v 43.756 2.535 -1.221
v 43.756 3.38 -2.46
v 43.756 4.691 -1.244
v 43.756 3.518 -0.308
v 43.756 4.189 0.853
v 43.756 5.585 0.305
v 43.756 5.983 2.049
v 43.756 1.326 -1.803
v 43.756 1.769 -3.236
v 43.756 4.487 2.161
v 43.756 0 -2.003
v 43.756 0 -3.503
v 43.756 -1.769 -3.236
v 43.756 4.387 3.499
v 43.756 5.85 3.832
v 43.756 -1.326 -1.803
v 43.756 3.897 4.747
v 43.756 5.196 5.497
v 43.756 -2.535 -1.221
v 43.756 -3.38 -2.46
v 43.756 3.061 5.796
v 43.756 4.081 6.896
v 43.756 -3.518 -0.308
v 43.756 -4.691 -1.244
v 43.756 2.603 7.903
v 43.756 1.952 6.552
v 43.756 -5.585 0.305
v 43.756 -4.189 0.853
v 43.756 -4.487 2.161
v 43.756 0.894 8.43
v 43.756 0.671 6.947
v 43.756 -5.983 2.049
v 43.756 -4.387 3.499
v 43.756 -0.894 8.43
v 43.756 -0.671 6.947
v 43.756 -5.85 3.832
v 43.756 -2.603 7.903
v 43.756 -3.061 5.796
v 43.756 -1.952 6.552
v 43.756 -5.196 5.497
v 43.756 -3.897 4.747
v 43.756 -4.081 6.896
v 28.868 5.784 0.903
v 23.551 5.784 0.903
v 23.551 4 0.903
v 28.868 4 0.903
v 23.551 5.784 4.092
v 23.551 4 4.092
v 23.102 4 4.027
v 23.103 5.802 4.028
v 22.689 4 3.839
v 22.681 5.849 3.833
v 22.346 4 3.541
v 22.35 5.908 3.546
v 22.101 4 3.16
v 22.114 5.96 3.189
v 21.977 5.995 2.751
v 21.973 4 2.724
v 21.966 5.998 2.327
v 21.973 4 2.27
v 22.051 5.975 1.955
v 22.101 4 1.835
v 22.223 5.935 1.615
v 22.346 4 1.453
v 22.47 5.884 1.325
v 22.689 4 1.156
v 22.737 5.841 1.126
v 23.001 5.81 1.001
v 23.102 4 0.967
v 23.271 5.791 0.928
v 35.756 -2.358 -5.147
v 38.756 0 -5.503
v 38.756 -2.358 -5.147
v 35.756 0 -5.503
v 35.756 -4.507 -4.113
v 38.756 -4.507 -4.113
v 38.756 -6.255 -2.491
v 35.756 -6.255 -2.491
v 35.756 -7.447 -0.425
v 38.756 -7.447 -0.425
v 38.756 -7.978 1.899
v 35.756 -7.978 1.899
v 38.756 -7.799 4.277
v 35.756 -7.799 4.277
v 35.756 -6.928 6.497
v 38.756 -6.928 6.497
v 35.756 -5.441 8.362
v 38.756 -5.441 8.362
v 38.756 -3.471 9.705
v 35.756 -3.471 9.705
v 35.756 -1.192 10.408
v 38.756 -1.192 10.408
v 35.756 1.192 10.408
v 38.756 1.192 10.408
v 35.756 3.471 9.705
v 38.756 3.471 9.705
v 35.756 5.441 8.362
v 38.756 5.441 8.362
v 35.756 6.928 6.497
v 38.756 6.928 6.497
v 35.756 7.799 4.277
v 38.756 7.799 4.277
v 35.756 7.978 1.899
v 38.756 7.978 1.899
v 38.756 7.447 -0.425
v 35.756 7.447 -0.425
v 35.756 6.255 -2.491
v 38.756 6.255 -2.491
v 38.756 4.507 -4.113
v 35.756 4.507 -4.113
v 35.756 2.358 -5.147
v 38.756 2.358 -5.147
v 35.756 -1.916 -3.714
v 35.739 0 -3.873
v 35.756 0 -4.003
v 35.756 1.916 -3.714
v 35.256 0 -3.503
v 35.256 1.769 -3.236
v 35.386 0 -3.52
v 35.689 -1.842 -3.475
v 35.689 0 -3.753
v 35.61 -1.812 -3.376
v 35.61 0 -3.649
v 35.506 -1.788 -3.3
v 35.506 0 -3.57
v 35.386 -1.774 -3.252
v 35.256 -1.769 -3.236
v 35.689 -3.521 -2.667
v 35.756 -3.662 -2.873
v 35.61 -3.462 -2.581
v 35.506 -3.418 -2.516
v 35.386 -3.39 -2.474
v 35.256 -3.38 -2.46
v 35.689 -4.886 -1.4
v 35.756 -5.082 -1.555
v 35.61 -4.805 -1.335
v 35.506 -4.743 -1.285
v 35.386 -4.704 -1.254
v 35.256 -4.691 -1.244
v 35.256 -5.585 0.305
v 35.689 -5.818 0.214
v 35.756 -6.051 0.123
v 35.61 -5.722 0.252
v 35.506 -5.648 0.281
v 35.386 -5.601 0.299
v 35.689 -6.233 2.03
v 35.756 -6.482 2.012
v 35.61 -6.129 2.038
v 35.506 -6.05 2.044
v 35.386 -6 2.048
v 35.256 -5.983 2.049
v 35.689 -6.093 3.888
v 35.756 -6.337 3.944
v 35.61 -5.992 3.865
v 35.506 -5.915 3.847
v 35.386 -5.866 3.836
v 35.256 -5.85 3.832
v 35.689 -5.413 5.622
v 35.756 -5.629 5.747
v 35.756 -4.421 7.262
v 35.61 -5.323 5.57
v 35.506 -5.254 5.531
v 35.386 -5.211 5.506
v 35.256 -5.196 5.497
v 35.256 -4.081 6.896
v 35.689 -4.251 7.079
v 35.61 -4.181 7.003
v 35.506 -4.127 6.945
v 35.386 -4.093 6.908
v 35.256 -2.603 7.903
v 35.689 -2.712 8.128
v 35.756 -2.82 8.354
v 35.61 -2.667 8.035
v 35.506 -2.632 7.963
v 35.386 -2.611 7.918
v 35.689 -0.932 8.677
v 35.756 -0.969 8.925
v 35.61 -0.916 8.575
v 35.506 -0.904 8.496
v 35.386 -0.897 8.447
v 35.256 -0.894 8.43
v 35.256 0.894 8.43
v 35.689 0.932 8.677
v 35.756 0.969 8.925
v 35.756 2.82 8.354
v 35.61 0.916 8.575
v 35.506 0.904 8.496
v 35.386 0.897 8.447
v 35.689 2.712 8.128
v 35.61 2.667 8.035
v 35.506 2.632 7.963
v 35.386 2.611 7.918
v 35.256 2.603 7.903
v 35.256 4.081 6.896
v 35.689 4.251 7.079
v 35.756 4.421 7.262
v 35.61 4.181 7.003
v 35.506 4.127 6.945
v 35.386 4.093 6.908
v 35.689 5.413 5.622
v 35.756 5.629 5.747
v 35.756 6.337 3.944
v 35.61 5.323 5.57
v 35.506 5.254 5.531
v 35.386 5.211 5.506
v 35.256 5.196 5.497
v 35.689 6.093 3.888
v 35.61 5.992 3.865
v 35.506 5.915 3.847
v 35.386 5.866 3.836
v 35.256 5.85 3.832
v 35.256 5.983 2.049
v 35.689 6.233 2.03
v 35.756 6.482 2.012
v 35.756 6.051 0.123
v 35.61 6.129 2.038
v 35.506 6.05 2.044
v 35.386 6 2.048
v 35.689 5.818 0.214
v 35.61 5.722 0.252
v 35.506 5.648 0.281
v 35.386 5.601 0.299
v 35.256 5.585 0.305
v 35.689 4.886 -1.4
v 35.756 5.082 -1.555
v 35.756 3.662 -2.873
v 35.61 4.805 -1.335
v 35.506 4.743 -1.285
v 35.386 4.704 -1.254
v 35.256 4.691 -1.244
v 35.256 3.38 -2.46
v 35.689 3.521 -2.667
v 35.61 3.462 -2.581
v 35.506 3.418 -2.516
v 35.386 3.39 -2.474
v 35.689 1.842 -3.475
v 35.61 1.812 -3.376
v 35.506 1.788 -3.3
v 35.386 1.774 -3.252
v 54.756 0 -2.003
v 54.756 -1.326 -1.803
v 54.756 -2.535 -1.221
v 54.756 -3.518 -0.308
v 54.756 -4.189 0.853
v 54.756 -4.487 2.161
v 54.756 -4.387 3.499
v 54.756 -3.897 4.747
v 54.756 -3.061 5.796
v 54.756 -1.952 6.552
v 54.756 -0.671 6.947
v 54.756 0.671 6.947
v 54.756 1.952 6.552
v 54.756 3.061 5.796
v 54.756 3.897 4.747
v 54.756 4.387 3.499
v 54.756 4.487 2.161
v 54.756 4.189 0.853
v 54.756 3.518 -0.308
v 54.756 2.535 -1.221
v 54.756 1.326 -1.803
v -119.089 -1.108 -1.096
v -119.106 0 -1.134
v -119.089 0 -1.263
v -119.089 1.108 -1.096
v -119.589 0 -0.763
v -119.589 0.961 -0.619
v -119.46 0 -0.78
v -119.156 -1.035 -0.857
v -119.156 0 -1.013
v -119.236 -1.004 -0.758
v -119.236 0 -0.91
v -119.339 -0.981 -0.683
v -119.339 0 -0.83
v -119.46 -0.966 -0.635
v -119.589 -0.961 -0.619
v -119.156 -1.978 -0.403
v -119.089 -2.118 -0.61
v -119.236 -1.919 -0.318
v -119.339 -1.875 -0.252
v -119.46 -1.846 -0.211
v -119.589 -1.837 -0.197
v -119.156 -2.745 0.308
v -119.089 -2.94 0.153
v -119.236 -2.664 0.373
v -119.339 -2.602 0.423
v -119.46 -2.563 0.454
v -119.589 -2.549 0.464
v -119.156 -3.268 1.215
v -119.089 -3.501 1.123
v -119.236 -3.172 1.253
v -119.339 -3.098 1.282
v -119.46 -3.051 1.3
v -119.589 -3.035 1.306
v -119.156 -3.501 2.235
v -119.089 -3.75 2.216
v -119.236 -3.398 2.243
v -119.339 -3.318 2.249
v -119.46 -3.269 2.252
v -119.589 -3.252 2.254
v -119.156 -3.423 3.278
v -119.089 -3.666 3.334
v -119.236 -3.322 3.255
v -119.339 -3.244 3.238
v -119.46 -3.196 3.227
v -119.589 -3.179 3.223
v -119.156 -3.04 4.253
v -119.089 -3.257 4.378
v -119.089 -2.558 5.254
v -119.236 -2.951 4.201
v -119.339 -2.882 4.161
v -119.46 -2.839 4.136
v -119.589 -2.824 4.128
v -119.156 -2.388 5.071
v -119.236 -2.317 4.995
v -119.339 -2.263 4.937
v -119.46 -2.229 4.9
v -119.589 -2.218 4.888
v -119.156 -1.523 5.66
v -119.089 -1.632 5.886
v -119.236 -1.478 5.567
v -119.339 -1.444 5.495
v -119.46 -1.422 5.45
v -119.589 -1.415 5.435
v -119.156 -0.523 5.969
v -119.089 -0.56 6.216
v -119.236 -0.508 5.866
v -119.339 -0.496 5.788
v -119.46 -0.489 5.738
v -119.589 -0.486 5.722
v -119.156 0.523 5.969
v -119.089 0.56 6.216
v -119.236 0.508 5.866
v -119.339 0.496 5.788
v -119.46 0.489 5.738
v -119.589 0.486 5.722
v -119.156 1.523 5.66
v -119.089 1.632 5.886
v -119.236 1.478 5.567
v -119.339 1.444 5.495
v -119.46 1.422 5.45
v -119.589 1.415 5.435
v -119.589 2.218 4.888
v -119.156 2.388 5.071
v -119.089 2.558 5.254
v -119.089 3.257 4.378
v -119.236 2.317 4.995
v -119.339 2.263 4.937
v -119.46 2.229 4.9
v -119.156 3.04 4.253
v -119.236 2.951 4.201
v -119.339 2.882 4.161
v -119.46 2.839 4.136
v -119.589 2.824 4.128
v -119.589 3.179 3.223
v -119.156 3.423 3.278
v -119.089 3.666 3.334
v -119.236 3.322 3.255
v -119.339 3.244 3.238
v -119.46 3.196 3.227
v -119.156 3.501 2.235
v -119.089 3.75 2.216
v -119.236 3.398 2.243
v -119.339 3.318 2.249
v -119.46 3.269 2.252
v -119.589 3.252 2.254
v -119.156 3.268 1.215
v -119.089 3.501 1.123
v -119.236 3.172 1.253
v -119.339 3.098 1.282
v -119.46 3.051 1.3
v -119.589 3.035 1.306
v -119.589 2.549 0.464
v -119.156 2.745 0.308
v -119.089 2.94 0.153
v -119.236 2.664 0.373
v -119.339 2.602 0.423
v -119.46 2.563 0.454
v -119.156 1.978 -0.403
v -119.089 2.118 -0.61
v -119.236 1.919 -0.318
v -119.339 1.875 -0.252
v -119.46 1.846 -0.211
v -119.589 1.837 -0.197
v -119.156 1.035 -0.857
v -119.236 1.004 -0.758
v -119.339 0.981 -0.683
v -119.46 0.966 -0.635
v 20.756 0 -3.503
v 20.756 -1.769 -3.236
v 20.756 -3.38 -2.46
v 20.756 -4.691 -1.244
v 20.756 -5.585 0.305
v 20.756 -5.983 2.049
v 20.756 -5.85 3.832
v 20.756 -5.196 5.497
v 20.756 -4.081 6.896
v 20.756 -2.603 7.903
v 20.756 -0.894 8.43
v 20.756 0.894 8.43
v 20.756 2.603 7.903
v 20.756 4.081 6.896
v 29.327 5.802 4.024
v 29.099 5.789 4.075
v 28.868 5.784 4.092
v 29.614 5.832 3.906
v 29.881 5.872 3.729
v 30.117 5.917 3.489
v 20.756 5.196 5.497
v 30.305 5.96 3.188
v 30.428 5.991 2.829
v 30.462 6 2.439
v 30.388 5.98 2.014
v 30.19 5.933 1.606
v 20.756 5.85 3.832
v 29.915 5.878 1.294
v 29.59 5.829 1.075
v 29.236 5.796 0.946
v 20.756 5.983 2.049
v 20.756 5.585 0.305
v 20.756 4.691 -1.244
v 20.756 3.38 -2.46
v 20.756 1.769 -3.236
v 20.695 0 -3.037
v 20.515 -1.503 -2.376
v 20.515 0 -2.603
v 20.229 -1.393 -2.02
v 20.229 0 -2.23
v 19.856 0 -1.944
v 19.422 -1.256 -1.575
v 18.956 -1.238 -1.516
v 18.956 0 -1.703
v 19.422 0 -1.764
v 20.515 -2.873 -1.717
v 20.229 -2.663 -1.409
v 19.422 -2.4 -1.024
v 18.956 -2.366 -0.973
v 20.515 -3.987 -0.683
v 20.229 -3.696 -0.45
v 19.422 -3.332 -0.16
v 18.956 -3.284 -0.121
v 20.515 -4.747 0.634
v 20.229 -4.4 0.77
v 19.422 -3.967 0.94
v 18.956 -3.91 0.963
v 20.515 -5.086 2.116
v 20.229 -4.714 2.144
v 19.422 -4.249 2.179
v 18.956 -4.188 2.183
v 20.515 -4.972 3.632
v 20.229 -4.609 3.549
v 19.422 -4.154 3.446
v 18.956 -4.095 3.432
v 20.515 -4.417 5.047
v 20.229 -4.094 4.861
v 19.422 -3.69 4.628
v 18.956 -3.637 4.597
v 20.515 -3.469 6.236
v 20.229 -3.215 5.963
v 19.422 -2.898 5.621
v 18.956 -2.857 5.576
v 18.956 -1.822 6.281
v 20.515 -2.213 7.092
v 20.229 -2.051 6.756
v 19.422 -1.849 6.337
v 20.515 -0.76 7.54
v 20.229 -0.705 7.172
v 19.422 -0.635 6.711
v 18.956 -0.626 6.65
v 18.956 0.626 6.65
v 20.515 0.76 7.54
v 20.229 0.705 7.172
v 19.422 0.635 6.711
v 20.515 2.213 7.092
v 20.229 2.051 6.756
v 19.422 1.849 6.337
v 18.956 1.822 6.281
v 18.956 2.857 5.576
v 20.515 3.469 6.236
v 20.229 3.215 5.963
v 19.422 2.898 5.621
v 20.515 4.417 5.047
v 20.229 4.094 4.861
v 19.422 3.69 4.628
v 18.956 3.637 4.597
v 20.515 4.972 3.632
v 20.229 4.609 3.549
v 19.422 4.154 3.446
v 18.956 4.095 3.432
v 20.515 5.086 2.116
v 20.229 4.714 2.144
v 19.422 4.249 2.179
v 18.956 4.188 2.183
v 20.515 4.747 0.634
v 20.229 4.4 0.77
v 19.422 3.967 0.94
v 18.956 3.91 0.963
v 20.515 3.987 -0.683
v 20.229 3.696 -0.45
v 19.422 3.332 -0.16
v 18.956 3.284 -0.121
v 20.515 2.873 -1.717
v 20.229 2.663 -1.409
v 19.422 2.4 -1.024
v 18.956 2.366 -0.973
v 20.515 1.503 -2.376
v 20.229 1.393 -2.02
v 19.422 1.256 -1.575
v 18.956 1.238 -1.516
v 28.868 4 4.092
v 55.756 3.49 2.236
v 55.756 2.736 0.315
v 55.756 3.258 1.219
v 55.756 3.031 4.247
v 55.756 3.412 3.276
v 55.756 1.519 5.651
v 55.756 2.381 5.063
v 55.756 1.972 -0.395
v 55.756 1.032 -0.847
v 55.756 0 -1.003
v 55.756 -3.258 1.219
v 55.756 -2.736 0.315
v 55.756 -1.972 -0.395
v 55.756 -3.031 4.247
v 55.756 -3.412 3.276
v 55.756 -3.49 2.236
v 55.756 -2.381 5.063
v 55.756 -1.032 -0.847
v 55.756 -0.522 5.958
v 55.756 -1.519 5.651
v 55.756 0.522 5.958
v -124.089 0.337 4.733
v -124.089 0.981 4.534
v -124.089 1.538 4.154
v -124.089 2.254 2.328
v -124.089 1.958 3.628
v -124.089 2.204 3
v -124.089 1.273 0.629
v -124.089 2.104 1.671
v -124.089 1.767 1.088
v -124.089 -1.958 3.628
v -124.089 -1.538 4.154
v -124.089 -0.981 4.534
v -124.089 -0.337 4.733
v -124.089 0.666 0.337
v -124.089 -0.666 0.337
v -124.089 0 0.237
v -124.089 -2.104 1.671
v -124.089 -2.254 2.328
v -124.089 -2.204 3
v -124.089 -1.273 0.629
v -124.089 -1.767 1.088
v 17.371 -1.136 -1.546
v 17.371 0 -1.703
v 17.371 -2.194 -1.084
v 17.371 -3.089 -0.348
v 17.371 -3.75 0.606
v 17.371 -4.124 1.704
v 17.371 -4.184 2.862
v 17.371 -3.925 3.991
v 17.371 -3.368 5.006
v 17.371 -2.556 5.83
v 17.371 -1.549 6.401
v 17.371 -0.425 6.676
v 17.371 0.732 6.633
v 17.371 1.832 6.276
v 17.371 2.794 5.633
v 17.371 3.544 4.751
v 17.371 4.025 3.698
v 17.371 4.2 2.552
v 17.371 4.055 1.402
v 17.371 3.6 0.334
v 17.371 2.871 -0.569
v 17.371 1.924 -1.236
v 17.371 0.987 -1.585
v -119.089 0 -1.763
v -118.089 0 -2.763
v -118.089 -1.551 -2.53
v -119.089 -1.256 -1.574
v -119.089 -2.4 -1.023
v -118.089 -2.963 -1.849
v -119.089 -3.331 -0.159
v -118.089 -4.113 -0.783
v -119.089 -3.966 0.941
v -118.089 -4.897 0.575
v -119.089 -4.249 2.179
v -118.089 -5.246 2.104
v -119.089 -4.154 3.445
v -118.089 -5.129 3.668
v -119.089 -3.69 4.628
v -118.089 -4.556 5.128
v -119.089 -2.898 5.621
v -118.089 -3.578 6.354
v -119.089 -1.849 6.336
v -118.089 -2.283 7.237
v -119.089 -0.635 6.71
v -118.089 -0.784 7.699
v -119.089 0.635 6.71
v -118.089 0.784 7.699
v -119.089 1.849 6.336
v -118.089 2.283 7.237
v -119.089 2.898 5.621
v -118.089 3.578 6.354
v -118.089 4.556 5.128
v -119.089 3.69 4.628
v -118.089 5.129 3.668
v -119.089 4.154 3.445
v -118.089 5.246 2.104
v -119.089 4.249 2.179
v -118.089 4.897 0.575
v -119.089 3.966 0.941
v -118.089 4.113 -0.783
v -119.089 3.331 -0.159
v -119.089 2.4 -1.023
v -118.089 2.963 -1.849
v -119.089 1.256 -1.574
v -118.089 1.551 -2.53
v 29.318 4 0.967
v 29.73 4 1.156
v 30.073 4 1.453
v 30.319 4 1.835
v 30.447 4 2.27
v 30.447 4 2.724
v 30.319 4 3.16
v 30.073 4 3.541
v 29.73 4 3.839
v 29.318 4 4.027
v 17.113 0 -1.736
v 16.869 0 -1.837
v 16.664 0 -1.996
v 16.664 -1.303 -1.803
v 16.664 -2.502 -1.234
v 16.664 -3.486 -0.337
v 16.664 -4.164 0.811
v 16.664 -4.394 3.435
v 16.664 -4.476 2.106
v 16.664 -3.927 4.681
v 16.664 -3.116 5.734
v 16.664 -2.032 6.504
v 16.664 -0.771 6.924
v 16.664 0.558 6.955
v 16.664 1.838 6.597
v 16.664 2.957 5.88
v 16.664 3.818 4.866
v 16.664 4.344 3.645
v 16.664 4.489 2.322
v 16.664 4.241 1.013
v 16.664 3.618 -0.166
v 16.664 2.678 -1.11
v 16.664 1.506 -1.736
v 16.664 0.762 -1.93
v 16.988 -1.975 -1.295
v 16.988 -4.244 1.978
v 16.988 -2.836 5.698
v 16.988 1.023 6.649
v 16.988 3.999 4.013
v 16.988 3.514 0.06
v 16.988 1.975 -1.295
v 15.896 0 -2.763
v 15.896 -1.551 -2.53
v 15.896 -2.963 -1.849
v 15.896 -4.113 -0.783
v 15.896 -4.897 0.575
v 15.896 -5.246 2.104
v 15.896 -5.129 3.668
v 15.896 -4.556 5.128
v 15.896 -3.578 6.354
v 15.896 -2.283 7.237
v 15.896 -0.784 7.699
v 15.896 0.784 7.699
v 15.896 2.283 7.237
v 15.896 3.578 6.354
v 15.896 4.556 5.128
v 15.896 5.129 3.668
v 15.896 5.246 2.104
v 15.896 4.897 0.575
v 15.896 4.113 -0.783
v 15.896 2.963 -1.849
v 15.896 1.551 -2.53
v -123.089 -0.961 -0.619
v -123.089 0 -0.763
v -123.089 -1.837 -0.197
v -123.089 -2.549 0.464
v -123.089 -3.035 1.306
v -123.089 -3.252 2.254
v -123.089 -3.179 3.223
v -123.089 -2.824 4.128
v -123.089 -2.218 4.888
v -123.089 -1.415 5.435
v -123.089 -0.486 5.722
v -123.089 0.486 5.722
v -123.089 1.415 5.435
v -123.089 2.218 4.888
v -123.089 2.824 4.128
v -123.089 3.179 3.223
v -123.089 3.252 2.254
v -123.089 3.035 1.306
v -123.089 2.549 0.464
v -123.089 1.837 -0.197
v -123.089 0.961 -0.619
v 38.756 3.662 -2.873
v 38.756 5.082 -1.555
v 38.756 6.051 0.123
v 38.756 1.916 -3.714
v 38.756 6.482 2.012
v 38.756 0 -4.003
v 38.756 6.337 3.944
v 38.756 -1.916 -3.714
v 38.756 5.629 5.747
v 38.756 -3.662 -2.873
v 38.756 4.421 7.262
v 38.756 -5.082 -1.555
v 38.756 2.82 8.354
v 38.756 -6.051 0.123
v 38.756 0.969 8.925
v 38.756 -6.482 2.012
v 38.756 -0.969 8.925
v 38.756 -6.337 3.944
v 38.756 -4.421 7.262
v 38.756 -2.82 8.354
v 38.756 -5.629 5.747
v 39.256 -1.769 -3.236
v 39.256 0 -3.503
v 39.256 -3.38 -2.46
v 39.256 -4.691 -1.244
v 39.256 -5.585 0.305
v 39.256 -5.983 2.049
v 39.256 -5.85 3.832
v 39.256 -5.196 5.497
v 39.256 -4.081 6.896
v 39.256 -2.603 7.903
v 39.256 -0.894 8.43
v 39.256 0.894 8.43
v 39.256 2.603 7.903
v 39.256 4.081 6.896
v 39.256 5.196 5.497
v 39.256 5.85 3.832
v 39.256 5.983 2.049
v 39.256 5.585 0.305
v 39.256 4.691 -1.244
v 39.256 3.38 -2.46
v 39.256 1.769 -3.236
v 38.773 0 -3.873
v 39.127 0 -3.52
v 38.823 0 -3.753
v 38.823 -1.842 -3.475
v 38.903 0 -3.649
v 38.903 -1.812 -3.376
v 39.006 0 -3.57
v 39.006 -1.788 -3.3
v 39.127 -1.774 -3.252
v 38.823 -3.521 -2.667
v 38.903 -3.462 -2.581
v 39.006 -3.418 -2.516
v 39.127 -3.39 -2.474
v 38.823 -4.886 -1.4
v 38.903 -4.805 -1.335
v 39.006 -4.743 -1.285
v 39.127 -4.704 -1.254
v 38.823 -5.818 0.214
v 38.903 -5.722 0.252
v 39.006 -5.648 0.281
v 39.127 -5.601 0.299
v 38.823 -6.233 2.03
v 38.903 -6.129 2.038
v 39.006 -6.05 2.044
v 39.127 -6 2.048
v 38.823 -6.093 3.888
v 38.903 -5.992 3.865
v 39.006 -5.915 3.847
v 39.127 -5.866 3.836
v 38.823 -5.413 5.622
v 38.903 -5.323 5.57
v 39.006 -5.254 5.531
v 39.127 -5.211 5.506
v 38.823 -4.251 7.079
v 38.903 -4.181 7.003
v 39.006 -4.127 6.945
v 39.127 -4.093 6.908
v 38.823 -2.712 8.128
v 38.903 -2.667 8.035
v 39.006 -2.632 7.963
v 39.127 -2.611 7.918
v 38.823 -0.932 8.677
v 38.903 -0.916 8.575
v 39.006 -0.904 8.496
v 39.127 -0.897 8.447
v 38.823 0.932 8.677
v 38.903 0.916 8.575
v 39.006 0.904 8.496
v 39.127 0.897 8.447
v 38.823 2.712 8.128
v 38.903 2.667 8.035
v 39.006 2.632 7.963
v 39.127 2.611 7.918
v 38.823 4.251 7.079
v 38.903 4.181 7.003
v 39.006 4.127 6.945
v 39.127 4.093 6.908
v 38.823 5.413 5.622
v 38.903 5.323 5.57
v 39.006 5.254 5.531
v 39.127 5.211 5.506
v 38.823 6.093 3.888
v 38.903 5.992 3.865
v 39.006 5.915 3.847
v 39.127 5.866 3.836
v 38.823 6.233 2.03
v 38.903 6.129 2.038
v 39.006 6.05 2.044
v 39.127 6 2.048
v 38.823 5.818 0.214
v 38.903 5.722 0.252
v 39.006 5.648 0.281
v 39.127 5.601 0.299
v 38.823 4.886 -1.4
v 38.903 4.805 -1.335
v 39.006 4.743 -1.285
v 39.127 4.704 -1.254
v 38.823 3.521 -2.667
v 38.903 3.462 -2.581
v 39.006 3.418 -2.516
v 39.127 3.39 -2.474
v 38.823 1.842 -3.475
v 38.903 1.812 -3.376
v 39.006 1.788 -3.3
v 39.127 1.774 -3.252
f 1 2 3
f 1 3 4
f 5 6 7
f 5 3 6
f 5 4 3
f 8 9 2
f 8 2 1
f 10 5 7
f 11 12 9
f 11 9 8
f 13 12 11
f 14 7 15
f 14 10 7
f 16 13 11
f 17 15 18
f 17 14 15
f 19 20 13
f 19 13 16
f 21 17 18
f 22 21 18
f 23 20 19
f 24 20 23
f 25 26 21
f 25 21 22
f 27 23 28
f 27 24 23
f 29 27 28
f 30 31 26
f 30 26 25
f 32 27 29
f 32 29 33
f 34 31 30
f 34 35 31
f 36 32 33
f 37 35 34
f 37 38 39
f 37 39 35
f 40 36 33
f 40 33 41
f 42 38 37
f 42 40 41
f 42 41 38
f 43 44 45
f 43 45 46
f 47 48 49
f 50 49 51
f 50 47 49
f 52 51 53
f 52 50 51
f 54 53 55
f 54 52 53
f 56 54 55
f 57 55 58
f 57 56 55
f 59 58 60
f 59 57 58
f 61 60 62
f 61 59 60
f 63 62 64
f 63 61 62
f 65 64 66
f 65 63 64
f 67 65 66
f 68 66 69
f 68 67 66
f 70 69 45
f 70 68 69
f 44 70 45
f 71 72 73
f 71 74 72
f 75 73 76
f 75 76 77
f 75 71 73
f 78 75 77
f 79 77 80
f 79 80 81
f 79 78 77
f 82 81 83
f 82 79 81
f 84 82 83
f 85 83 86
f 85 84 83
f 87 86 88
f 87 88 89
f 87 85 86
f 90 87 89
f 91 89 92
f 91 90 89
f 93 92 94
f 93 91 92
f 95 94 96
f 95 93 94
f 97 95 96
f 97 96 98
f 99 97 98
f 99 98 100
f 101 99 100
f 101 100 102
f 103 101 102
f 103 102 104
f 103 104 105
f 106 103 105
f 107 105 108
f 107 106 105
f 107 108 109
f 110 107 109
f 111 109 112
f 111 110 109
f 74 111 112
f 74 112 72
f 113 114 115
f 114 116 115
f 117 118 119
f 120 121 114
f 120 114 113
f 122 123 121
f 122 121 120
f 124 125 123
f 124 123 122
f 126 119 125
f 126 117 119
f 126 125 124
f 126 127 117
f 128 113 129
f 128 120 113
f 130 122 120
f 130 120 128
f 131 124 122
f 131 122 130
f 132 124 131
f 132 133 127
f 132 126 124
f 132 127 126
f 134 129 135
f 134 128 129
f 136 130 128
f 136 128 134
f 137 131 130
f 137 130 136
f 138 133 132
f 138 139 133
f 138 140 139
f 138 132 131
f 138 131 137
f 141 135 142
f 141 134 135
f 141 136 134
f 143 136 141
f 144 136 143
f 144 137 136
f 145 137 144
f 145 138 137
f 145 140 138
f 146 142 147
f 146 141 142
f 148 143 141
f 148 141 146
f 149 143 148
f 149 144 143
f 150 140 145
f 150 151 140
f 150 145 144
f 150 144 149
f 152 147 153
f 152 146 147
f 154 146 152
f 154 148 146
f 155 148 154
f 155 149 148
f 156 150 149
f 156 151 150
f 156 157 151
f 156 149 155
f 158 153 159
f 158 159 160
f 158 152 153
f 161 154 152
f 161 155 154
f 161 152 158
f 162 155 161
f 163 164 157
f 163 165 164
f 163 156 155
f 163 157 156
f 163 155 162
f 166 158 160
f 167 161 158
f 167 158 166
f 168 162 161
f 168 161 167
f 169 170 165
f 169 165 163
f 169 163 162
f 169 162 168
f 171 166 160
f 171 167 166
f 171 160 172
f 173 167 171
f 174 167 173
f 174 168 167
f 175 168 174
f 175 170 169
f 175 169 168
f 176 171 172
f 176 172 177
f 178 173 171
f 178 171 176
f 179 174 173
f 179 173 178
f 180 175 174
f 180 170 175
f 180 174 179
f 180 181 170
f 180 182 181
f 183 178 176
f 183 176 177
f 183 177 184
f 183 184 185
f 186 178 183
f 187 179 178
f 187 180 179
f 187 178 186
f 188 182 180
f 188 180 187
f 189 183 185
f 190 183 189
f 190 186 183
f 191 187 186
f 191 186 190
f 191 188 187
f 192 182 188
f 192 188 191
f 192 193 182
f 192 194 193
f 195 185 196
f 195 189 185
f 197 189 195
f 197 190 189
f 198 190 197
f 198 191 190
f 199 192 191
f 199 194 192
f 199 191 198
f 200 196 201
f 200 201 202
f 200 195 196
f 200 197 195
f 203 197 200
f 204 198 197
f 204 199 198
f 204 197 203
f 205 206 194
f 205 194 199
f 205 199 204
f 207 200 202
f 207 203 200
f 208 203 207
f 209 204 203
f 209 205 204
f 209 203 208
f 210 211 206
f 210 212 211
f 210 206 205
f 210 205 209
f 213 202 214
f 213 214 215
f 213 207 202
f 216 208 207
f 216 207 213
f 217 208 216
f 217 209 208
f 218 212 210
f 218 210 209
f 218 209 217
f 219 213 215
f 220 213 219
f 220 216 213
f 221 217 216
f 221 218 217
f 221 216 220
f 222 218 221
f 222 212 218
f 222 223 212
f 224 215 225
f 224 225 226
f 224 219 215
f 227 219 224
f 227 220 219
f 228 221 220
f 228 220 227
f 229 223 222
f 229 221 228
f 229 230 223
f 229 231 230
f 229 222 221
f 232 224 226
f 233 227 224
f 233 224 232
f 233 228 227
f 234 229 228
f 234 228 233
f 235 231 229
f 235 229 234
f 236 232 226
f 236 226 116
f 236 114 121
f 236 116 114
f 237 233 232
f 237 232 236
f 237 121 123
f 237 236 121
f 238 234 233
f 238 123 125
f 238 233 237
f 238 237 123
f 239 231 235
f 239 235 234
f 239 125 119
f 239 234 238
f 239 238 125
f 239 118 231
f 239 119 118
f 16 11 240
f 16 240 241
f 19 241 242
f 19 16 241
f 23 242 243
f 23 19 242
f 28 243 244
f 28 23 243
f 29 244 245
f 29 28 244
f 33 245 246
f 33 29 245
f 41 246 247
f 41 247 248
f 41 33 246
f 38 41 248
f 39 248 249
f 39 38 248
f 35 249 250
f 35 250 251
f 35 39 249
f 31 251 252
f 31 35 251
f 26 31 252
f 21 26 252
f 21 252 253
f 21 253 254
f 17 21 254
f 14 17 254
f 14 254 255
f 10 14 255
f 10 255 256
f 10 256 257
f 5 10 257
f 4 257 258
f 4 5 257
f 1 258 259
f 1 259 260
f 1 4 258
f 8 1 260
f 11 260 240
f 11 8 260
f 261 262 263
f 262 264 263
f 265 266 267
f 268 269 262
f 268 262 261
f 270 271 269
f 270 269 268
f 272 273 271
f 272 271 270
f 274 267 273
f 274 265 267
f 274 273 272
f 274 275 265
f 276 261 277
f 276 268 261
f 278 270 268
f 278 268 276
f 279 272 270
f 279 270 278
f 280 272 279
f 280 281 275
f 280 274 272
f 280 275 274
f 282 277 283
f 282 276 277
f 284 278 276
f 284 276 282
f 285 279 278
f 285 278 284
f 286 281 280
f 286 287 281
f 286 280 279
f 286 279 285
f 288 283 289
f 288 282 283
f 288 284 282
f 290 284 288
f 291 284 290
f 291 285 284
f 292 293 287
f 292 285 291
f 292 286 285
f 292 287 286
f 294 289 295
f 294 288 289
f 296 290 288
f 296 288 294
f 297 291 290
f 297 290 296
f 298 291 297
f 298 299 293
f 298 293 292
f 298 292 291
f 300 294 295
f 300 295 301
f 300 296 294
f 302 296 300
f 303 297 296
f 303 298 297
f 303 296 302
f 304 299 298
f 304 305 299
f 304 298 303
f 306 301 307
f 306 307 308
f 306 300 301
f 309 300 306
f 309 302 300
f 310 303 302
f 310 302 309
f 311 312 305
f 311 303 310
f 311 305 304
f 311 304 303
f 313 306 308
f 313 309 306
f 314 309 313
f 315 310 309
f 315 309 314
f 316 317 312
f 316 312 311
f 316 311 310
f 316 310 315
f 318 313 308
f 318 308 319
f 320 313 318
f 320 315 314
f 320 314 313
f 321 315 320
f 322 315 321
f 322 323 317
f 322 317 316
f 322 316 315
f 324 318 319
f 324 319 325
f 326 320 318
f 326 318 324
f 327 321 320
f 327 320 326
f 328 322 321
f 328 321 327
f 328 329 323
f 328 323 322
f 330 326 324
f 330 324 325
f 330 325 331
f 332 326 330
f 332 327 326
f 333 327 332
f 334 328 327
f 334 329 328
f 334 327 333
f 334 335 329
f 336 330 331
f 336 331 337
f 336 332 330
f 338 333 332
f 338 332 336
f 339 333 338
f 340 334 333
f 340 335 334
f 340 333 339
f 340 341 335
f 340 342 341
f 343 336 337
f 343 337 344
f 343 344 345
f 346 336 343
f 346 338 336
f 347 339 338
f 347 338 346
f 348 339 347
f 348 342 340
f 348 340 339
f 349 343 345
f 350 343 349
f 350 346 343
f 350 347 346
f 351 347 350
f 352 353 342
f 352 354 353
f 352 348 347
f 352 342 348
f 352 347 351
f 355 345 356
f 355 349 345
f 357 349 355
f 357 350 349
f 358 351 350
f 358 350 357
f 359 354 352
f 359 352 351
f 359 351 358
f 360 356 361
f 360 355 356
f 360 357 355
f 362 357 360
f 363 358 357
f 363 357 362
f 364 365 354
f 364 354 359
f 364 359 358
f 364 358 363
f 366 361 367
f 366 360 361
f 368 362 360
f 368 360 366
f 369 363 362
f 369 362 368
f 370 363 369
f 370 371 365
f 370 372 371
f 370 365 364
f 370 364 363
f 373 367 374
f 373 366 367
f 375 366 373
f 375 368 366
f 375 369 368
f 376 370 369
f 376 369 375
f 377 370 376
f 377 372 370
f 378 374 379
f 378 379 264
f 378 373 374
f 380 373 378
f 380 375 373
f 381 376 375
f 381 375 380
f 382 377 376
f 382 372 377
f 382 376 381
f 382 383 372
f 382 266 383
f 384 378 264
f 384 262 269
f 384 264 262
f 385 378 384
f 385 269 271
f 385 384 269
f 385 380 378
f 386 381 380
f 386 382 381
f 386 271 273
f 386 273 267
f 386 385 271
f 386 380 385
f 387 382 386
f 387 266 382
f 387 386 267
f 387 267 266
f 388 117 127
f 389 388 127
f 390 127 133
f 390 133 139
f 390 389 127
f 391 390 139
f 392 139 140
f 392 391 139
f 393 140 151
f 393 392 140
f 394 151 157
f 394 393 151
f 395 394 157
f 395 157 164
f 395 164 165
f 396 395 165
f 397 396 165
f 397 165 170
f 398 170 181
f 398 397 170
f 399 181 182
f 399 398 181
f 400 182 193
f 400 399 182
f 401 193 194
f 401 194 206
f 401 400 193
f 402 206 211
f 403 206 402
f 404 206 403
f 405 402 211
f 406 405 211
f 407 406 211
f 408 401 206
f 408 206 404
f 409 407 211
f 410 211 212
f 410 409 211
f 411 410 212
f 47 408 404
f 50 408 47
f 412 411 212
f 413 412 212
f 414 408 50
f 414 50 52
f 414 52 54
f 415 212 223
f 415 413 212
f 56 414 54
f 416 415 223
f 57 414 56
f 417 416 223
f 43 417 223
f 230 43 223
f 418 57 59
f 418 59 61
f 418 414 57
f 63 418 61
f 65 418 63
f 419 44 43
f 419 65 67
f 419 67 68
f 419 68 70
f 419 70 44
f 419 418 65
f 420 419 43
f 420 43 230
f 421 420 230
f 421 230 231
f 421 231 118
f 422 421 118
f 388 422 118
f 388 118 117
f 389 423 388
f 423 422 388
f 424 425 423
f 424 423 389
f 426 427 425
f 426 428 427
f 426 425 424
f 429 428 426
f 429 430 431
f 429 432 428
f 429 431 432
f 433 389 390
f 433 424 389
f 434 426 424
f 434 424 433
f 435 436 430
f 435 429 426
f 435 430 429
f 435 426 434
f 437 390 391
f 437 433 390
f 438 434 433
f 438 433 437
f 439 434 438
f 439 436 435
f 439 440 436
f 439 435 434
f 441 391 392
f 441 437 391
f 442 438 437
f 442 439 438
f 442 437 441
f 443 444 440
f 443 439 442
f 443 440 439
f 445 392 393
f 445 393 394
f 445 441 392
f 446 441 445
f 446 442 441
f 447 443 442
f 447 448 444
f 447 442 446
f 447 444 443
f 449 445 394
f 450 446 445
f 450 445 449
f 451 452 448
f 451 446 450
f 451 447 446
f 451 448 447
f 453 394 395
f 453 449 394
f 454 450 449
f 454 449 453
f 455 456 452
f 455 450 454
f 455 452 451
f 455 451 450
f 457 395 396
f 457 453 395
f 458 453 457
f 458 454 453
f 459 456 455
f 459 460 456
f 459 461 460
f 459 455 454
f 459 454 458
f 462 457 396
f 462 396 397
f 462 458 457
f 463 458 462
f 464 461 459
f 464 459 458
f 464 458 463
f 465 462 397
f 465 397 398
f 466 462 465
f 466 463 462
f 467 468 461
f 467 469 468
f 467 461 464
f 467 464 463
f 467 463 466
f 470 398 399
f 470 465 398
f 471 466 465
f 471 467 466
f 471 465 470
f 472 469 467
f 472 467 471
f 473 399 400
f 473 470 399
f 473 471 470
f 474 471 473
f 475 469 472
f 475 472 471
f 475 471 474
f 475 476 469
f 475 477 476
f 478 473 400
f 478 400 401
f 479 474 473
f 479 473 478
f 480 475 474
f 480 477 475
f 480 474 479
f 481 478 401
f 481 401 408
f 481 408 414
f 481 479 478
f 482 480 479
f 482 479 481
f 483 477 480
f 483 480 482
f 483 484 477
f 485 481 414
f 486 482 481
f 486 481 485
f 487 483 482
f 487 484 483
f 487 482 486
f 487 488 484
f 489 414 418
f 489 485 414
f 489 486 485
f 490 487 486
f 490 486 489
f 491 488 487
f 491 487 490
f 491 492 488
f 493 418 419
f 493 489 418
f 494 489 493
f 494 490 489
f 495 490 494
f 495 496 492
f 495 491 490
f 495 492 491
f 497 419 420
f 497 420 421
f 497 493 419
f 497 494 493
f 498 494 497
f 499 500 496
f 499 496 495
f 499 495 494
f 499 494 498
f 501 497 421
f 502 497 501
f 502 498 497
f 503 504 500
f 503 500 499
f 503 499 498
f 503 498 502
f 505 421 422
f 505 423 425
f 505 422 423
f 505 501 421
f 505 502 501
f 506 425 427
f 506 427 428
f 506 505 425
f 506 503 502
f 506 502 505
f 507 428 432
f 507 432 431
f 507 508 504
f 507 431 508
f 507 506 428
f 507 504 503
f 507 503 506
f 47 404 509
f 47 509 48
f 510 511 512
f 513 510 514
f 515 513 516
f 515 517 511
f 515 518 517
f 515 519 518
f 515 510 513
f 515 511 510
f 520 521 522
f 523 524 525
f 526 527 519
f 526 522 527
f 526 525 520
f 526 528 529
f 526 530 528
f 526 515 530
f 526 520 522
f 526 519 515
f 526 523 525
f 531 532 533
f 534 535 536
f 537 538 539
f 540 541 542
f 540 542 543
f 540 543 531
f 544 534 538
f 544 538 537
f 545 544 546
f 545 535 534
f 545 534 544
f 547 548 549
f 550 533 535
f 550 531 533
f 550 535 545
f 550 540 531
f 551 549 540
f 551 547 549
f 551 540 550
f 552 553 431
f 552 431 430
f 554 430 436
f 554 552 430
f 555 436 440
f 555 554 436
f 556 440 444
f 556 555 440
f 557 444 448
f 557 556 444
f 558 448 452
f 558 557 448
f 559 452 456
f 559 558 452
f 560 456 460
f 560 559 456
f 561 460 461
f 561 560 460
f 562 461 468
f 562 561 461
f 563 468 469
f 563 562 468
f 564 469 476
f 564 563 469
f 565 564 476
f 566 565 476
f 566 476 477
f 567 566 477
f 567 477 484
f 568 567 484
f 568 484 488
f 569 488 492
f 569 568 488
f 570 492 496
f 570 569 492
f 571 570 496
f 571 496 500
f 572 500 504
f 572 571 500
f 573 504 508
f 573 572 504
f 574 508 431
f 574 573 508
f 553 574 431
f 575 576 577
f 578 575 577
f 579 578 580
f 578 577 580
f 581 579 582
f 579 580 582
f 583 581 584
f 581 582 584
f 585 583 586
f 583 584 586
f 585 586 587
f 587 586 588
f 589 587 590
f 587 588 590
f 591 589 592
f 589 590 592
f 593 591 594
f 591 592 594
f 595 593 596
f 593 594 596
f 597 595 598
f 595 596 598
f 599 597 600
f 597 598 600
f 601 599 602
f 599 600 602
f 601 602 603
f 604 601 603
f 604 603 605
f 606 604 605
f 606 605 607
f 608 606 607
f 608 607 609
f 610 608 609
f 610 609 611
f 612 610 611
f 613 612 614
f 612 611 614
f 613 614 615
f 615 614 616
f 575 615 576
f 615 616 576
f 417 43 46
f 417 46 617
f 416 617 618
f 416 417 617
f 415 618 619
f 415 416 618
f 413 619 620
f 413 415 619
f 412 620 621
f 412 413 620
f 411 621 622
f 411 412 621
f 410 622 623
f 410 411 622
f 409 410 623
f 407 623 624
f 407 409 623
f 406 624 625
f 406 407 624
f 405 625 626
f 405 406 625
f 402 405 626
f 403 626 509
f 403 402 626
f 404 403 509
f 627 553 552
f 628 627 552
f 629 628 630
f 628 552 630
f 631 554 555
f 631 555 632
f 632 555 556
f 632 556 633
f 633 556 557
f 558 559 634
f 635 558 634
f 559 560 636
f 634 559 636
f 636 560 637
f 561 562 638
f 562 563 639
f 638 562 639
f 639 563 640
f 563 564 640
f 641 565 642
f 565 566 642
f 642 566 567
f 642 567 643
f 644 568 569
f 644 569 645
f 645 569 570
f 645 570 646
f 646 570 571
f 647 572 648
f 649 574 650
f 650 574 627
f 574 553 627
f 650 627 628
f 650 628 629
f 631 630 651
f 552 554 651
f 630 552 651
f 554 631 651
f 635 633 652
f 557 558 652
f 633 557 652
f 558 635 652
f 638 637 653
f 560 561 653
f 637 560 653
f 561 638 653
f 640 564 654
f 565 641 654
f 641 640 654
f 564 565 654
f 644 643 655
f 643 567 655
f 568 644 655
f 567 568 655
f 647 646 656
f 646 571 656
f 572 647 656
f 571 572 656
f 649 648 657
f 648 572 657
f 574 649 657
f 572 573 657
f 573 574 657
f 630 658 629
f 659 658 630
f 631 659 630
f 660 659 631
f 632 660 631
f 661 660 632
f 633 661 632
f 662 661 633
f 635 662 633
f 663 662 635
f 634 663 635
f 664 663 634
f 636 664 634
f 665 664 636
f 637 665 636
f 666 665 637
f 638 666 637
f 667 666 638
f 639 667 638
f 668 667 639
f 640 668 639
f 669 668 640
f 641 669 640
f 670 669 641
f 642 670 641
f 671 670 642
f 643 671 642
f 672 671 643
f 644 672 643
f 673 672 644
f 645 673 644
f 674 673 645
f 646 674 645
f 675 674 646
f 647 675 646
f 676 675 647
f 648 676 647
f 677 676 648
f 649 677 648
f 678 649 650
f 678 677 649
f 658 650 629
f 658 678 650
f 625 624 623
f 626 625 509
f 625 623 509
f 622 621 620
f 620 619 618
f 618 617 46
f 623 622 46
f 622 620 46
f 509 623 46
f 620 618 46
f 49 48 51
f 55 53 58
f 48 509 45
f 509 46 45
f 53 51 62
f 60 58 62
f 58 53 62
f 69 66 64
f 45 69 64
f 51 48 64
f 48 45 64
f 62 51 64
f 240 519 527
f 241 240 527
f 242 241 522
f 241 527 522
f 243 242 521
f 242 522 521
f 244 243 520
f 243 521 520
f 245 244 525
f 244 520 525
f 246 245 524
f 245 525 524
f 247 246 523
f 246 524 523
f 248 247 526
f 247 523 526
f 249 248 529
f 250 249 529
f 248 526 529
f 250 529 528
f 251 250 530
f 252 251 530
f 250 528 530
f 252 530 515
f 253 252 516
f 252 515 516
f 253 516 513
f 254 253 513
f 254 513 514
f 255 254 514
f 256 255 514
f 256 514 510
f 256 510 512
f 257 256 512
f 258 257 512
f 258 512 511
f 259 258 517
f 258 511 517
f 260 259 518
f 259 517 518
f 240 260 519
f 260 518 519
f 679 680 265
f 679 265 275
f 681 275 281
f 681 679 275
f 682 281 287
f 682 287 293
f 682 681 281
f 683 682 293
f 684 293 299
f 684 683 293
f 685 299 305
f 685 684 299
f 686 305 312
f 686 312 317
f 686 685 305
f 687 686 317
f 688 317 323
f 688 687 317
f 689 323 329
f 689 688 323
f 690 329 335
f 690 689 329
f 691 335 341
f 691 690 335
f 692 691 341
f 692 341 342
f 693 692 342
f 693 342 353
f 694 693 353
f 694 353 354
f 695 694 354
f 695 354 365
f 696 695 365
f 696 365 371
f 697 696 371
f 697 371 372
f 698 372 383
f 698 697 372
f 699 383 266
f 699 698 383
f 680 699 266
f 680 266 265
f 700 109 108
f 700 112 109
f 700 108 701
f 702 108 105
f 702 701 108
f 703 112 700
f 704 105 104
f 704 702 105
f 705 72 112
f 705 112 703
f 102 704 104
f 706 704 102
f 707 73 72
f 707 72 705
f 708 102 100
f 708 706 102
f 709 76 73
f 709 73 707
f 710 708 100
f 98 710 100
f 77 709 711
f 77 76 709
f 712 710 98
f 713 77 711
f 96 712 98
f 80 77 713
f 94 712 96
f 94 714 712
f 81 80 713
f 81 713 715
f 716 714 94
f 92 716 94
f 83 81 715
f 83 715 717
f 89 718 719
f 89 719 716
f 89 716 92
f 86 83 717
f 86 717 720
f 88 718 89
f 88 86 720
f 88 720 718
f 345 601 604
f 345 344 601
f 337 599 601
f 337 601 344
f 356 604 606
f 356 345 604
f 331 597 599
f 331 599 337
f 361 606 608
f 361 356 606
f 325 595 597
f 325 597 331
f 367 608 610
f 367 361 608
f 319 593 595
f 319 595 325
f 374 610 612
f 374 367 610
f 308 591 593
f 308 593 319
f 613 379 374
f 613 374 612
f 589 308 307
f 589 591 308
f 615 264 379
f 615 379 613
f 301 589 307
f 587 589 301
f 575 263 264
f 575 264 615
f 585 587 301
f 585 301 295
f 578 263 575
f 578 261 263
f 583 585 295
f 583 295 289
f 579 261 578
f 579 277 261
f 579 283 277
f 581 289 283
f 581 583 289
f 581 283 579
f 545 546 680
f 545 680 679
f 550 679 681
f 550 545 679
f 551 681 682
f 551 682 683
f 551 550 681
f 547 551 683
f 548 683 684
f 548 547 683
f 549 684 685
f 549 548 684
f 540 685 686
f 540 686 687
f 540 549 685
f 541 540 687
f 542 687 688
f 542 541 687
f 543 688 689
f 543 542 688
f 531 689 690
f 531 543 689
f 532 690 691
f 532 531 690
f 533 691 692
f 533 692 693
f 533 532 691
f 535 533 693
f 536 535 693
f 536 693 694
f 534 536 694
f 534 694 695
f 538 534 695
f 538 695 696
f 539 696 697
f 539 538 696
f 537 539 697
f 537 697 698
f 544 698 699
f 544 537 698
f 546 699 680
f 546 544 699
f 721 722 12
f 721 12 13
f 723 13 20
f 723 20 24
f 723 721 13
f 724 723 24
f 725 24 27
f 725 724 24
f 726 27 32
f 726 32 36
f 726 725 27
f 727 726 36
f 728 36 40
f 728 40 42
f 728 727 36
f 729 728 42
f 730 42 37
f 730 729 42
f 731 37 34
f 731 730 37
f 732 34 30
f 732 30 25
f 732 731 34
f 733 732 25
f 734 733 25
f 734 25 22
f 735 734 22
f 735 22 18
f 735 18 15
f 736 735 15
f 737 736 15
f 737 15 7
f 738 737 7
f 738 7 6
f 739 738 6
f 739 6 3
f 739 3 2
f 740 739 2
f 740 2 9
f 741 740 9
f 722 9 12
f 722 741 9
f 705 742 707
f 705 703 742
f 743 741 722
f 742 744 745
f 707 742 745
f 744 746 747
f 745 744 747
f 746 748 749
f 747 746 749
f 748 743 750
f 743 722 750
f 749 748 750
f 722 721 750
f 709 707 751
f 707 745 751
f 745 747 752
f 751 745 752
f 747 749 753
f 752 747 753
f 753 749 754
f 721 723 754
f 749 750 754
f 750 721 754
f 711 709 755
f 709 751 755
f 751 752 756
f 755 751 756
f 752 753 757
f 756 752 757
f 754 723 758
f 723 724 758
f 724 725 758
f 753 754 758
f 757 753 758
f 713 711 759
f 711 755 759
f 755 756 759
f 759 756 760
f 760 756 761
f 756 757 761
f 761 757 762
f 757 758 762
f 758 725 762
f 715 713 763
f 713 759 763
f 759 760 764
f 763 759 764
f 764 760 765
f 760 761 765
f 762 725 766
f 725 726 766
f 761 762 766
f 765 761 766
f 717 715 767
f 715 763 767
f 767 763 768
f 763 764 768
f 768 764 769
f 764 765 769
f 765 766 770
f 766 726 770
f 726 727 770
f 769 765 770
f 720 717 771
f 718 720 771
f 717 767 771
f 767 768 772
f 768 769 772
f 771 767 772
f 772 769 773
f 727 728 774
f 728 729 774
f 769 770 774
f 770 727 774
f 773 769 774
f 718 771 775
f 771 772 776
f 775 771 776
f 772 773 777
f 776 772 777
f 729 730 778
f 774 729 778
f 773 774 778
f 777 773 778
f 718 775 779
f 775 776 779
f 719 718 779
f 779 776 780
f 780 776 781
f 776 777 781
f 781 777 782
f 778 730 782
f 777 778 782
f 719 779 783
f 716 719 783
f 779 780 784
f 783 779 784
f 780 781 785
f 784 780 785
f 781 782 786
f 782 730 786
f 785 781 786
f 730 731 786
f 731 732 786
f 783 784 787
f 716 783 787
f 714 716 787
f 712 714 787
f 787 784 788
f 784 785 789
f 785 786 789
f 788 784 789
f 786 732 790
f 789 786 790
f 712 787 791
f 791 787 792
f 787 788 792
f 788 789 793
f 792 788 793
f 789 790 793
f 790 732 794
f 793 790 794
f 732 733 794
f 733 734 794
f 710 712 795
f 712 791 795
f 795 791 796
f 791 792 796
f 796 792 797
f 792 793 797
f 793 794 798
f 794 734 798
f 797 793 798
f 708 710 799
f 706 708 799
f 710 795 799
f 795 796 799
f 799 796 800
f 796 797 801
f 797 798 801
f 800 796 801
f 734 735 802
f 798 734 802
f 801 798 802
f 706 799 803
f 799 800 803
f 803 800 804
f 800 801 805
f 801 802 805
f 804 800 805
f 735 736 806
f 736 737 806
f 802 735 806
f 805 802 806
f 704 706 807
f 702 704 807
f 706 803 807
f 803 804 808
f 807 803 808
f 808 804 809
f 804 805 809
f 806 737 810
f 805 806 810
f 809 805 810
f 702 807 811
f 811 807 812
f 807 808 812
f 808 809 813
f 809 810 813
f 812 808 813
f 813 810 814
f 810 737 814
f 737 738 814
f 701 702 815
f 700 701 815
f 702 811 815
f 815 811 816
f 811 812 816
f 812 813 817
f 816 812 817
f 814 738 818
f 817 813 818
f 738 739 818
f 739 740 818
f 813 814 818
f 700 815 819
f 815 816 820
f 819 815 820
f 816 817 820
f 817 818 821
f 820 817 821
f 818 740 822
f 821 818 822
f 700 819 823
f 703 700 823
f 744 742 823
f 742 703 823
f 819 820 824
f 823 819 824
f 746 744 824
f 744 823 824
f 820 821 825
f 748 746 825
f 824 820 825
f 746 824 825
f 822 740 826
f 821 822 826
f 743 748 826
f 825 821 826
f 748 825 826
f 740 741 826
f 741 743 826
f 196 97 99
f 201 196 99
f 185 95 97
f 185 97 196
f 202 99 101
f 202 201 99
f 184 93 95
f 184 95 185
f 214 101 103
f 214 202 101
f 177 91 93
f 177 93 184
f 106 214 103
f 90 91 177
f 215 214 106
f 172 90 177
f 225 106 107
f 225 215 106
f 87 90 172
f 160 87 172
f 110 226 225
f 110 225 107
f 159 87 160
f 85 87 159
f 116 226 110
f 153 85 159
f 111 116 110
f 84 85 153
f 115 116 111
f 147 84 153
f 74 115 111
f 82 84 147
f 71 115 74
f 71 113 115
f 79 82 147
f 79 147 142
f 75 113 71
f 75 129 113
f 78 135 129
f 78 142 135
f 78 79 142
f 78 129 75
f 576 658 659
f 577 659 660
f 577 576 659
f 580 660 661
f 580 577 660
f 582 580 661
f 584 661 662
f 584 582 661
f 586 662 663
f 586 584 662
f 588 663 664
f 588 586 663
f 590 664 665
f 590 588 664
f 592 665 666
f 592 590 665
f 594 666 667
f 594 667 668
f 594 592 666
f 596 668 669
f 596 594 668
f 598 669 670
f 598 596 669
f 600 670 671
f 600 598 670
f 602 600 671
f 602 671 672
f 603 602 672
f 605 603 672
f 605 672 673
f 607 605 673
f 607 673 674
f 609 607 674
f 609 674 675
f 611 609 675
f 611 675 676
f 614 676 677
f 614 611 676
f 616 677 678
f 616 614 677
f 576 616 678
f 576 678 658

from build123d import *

# Parameters (mm, degrees)
FILLET_1_R          = 0.5
FILLET_2_R          = 0.5
FILLET_3_R          = 1
FILLET_4_R          = 0.5
CHAMFER_1_SIZE      = 1
CHAMFER_2_SIZE      = 1
CUT_EXTRUDE_1_DEPTH = 6


with BuildPart() as part:
    # Эскиз1 → Повернуть1 (revolve)
    with BuildSketch(Plane(origin=(0, 0, 0), x_dir=(1, 0, 0), z_dir=(0, 1, 0)), mode=Mode.PRIVATE) as revolve_1_sk:
        with BuildLine():
            Line((55.756411679, -2.497269463), (55.756411679, -6.997269463))
            Line((55.756411679, -6.997269463), (43.756411679, -6.997269463))
            Line((43.756411679, -6.997269463), (43.756411679, -8.497269463))
            Line((43.756411679, -8.497269463), (38.756411679, -8.497269463))
            Line((38.756411679, -8.497269463), (38.756411679, -10.497269463))
            Line((38.756411679, -10.497269463), (35.756411679, -10.497269463))
            Line((35.756411679, -10.497269463), (35.756411679, -8.497269463))
            Line((35.756411679, -8.497269463), (20.756411679, -8.497269463))
            ThreePointArc((20.756411679, -8.497269463), (20.229203885, -7.224477257), (18.956411679, -6.697269463))
            Line((18.956411679, -6.697269463), (16.956411679, -6.697269463))
            Line((16.956411679, -6.697269463), (15.895751507, -7.757929635))
            Line((15.895751507, -7.757929635), (-119.089435131, -7.757929635))
            Line((-119.089435131, -7.757929635), (-119.089435131, -5.757929635))
            Line((-119.089435131, -5.757929635), (-124.089435131, -5.757929635))
            Line((-124.089435131, -5.757929635), (-124.089435131, -2.497269463))
            Line((-124.089435131, -2.497269463), (55.756411679, -2.497269463))
        make_face()
    revolve(revolve_1_sk.sketch.rotate(Axis((55.756411679, 0, 2.497269463), (-1, 0, 0)), 180), axis=Axis((55.756411679, 0, 2.497269463), (-1, 0, 0)))

    # Скругление1
    fillet_1_edges = [part.edges().sort_by_distance(p)[0] for p in [
        (35.756411679, 0, 8.497269463),
    ]]
    fillet(fillet_1_edges, radius=FILLET_1_R)

    # Скругление2
    fillet_2_edges = [part.edges().sort_by_distance(p)[0] for p in [
        (38.756411679, 0, 8.497269463),
    ]]
    fillet(fillet_2_edges, radius=FILLET_2_R)

    # Скругление3
    fillet_3_edges = [part.edges().sort_by_distance(p)[0] for p in [
        (16.956411679, 0, 6.697269463),
    ]]
    fillet(fillet_3_edges, radius=FILLET_3_R)

    # Скругление4
    fillet_4_edges = [part.edges().sort_by_distance(p)[0] for p in [
        (-119.089435131, 0, 5.757929635),
    ]]
    fillet(fillet_4_edges, radius=FILLET_4_R)

    # Фаска1
    chamfer_1_edges = [part.edges().sort_by_distance(p)[0] for p in [
        (55.756411679, 0, 6.997269463),
        (-119.089435131, 0, 7.757929635),
    ]]
    chamfer(chamfer_1_edges, length=CHAMFER_1_SIZE)

    # Фаска2
    chamfer_2_edges = [part.edges().sort_by_distance(p)[0] for p in [
        (-124.089435131, 0, 5.757929635),
    ]]
    chamfer(chamfer_2_edges, length=CHAMFER_2_SIZE)

    # Эскиз2 → Вырез-Вытянуть1 (cut)
    with BuildSketch(Plane(origin=(0, 10, 0), x_dir=(1, 0, 0), z_dir=(0, 1, 0))):
        with BuildLine():
            Line((23.550856254, -0.902866319), (28.868398961, -0.902866319))
            ThreePointArc((28.868398961, -0.902866319), (30.462802104, -2.497269463), (28.868398961, -4.091672607))
            Line((28.868398961, -4.091672607), (23.550856254, -4.091672607))
            ThreePointArc((23.550856254, -4.091672607), (21.95645311, -2.497269463), (23.550856254, -0.902866319))
        make_face()
    extrude(amount=-CUT_EXTRUDE_1_DEPTH, mode=Mode.SUBTRACT)


solid = part.part
